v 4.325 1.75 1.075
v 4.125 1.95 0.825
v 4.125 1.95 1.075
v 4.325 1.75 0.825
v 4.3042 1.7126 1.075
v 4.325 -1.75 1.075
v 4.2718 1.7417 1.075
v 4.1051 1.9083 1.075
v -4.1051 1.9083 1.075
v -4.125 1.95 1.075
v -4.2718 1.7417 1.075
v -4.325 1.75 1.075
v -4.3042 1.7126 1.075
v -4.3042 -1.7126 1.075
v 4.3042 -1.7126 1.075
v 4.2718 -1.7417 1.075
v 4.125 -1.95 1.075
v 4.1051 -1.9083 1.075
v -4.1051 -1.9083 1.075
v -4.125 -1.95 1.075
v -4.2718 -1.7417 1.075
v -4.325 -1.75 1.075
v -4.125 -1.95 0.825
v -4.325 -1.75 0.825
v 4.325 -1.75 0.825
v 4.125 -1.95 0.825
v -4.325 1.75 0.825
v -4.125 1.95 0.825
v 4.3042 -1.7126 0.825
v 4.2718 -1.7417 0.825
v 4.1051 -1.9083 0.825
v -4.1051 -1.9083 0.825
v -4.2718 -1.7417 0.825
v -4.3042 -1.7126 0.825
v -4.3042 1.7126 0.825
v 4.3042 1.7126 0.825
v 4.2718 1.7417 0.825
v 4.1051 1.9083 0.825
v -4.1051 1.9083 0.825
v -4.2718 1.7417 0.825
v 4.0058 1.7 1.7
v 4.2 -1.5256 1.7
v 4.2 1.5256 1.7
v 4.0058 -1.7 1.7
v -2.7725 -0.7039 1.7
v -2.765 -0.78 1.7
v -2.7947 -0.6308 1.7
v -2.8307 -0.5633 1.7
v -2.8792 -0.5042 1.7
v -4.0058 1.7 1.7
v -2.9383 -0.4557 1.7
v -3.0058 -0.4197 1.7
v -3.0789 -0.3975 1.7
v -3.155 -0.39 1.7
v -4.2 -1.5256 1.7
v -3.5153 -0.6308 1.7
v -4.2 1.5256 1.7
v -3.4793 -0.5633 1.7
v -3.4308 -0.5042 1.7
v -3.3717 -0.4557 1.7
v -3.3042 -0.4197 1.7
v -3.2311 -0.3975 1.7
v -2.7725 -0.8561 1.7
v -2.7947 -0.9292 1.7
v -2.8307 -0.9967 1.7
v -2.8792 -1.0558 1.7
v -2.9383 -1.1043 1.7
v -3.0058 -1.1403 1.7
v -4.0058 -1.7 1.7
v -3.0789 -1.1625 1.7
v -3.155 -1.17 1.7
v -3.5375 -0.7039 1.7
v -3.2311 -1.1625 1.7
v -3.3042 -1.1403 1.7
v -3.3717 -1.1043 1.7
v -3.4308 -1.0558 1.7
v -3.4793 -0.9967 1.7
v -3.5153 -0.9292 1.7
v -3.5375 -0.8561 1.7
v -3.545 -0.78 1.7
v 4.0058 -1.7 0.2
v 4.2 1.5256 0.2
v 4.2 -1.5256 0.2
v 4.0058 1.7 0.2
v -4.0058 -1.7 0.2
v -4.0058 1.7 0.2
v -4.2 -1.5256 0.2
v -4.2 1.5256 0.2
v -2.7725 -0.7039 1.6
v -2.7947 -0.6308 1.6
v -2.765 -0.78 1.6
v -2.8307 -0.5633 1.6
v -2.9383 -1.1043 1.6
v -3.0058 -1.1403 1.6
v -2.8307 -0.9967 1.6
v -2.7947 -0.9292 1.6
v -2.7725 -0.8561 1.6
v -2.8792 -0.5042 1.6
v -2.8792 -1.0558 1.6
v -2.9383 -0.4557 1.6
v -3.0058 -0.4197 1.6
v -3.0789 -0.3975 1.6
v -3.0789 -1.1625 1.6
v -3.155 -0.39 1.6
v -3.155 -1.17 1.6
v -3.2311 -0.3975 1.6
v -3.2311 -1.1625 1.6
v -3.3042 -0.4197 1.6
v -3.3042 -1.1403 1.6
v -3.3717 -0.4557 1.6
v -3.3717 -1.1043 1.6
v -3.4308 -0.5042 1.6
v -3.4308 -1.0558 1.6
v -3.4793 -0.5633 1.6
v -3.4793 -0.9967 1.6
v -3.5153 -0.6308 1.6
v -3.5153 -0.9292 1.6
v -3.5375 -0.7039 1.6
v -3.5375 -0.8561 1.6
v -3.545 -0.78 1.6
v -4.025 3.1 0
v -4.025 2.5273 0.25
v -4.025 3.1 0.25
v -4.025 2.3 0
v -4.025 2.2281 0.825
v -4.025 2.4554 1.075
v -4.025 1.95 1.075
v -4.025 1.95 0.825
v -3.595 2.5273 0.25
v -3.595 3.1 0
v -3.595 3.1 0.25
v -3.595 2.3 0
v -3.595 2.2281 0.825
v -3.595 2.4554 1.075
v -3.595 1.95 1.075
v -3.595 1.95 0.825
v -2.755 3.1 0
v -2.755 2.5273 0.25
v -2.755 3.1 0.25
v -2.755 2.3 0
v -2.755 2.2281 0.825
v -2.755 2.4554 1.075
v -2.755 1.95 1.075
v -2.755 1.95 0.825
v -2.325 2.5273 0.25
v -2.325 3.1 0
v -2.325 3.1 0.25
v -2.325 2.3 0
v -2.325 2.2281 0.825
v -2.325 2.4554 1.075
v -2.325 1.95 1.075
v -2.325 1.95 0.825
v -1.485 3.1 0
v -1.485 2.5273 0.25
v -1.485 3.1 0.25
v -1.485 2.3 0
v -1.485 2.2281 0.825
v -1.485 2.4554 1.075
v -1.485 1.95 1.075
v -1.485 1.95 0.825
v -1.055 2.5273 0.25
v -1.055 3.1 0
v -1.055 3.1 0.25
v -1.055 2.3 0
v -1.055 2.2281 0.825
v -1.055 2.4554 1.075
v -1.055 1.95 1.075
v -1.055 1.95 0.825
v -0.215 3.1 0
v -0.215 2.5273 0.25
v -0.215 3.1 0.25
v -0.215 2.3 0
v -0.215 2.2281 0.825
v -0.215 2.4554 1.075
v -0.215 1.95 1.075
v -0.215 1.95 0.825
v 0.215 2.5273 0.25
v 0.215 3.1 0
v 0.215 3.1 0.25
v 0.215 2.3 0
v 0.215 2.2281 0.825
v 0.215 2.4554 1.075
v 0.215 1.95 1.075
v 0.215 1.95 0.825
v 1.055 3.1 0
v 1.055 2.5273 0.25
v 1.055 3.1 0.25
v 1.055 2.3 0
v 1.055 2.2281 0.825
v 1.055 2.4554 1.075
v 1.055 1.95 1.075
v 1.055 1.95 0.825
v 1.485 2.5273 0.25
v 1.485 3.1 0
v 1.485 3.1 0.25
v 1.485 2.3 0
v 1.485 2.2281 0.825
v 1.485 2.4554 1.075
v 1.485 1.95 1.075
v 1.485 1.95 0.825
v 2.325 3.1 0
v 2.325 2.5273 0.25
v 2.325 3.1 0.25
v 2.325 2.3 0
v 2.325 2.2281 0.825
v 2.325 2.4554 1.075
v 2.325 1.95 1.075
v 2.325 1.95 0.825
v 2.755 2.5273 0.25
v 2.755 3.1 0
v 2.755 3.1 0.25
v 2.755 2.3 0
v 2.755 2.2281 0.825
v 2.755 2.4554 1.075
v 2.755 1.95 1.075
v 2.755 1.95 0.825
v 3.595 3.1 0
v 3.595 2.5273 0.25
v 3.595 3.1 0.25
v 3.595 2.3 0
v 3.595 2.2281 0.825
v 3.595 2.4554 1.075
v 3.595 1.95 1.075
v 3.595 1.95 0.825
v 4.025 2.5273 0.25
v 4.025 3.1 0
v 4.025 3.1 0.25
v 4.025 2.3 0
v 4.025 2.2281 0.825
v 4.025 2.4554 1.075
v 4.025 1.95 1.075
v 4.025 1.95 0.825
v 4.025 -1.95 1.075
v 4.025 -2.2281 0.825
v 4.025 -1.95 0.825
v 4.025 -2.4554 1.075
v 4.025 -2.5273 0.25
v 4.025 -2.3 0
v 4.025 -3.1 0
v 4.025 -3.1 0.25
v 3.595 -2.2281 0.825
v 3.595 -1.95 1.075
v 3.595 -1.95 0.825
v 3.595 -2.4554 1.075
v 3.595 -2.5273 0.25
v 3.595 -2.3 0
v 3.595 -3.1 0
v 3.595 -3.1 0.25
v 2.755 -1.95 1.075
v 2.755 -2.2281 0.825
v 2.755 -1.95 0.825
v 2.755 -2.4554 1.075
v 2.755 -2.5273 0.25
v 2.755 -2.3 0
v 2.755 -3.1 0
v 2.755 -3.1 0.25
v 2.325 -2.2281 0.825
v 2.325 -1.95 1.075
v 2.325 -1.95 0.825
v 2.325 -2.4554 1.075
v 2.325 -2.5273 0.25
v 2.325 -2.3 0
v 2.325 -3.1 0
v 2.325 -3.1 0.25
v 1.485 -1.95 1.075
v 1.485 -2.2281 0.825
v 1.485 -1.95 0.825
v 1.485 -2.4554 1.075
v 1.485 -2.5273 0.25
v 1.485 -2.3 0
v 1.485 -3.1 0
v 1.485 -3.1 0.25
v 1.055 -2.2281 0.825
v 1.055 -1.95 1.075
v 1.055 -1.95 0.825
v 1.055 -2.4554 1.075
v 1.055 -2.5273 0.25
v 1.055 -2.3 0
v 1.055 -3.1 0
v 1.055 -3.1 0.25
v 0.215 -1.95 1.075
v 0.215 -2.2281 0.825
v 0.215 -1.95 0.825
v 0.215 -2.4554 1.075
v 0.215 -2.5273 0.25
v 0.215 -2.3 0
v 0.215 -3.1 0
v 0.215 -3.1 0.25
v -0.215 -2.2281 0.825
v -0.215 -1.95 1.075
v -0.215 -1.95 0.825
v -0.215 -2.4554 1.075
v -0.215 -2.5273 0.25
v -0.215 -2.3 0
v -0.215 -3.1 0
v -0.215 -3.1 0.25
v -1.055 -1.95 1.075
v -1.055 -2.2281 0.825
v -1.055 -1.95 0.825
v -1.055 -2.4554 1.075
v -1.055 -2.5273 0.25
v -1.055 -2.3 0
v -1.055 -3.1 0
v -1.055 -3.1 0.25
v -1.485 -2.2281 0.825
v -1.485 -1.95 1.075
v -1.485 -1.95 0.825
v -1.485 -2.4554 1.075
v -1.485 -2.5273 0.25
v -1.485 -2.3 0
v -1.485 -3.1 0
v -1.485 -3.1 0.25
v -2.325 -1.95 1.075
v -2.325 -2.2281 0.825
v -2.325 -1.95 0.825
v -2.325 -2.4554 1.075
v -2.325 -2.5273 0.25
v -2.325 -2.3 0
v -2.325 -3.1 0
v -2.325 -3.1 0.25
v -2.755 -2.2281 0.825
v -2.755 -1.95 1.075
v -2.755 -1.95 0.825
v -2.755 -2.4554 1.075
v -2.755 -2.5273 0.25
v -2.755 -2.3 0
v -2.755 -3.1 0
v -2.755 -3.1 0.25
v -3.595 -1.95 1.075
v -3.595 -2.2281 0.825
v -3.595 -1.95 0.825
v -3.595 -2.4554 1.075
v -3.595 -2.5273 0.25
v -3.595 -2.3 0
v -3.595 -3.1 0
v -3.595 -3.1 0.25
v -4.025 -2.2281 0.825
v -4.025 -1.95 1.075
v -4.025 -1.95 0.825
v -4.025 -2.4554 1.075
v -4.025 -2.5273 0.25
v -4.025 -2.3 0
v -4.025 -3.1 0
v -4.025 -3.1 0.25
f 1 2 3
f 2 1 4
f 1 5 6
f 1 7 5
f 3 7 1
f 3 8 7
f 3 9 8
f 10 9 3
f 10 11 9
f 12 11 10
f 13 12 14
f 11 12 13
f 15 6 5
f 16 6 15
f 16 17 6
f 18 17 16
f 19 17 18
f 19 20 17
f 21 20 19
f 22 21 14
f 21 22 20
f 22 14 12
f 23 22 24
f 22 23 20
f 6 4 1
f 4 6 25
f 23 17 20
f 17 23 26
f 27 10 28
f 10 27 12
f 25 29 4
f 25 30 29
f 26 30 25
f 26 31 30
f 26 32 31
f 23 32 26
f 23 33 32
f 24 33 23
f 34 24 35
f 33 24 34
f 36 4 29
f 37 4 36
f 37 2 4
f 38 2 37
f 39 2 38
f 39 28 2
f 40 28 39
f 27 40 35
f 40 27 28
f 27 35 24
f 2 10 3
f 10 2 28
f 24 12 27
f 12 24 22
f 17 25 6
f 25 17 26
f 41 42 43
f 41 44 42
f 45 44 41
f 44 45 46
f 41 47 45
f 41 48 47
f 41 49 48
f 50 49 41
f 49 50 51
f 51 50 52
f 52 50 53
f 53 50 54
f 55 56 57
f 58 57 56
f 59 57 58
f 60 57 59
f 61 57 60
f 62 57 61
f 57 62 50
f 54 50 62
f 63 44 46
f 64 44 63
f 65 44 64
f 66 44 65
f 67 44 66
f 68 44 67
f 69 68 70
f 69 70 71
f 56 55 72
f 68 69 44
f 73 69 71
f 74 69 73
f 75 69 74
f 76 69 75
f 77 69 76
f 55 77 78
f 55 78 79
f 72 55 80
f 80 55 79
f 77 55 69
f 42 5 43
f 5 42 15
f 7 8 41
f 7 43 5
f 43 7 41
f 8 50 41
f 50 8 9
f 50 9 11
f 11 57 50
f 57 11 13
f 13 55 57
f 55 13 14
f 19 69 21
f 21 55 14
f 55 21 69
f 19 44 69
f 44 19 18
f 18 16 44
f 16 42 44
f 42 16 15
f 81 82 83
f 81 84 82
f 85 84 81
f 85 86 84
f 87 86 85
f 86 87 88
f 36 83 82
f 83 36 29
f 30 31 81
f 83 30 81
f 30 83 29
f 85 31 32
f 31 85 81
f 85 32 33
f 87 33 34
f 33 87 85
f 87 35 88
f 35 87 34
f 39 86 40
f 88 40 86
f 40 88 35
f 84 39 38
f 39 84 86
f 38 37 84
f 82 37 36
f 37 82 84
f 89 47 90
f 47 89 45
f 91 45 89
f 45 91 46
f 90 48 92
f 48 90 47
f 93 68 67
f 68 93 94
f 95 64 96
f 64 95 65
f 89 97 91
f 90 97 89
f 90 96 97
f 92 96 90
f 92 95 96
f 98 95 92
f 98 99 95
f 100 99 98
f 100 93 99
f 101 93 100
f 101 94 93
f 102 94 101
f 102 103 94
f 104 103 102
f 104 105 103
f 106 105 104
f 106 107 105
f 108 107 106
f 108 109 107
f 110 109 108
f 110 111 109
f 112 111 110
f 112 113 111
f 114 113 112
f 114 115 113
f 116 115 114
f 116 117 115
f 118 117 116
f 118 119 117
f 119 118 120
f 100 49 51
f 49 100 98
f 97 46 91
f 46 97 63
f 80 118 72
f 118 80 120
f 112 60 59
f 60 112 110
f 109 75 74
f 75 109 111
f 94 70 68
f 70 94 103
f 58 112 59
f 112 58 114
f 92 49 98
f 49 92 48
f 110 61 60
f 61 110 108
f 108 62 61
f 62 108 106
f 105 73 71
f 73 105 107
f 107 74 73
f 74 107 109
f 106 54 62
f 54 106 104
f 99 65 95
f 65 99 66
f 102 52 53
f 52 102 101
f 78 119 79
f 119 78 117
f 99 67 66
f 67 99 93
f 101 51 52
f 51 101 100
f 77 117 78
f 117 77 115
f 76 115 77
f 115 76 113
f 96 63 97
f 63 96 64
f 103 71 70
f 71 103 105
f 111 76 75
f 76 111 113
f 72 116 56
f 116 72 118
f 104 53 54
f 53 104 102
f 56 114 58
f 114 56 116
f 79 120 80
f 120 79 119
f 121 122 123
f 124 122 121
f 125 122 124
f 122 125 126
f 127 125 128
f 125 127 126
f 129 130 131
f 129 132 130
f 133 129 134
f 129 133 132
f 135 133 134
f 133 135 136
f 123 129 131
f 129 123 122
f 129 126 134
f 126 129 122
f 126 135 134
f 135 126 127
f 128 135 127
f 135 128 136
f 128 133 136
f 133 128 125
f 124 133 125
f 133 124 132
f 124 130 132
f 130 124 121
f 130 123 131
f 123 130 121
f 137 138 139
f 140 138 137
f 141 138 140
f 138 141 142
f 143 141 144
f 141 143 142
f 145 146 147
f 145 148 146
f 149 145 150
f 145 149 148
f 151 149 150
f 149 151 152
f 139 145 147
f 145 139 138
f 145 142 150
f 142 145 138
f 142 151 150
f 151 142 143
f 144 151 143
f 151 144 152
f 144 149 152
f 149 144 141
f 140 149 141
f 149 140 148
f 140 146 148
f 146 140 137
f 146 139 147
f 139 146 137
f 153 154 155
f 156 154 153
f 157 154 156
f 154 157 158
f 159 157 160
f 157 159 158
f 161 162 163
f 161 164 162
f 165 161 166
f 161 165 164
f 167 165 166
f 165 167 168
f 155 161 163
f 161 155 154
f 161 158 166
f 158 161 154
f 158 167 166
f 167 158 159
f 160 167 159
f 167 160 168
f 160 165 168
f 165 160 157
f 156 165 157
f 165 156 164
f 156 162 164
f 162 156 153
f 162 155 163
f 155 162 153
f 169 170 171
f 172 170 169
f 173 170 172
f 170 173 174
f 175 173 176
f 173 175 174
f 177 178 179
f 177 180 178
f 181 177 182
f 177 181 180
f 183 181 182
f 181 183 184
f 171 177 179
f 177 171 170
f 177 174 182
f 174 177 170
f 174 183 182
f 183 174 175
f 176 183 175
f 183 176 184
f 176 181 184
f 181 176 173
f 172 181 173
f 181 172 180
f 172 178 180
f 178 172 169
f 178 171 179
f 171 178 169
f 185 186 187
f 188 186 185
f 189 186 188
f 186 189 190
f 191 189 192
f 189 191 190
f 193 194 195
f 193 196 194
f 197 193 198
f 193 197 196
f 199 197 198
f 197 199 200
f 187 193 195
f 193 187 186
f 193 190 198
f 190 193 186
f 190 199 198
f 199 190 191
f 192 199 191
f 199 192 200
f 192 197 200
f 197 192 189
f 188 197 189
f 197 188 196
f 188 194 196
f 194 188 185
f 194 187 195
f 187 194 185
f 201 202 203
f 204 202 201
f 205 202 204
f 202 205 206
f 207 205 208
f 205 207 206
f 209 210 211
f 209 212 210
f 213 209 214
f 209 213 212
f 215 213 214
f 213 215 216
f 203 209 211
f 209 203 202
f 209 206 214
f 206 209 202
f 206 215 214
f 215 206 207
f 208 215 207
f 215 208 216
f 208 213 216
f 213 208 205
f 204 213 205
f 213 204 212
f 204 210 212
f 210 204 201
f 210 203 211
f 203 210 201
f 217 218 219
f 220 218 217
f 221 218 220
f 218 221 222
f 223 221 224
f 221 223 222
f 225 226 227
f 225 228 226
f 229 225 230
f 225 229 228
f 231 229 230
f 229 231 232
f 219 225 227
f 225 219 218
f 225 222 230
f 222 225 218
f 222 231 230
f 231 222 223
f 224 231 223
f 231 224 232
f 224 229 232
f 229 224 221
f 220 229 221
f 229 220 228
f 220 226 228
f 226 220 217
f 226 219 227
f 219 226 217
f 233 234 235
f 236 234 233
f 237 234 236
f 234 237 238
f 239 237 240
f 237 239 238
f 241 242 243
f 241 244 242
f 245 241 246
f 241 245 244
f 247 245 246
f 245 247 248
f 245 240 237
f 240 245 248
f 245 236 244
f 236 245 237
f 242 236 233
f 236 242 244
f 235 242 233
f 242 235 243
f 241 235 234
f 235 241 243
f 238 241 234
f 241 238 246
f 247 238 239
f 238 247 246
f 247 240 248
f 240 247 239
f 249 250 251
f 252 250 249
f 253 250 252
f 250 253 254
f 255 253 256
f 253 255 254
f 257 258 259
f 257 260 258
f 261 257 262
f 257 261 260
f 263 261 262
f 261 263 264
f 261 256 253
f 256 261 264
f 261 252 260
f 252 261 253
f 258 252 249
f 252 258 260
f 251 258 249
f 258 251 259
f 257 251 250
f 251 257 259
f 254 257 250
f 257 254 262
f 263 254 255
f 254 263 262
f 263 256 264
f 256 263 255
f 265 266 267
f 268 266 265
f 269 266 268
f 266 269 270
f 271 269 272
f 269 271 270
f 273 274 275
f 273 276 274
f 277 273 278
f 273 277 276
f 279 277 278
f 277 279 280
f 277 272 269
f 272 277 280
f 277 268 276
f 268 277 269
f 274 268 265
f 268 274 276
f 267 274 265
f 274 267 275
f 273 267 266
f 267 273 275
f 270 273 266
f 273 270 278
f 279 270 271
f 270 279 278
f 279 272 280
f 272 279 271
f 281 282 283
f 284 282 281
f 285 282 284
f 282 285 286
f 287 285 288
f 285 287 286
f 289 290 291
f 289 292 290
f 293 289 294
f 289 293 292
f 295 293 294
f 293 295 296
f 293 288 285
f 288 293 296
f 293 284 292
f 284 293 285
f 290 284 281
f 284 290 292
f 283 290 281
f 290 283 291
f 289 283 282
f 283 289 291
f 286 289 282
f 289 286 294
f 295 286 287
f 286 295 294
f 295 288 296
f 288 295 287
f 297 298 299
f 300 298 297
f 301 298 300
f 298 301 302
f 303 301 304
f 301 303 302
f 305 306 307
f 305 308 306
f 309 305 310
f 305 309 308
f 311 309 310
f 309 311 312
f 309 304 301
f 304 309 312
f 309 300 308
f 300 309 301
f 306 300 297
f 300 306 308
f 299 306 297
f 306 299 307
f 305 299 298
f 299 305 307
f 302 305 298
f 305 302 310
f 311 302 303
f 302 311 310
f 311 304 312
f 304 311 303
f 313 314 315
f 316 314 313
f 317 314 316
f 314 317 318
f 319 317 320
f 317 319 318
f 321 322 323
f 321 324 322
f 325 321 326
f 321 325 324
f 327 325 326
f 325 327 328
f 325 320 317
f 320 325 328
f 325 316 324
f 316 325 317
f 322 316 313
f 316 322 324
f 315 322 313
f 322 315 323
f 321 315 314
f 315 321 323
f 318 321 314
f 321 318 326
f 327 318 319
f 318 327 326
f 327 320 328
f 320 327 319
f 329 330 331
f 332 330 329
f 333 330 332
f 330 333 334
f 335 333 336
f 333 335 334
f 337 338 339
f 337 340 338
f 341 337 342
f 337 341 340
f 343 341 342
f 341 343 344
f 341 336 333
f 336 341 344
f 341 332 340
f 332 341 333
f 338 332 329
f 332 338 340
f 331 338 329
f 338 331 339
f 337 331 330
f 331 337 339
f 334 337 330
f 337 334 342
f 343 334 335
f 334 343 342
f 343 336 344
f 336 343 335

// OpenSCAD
pins = 14;
pin_pitch = 1.27;
pin_width = 0.43;
pin_seating = 0.8;
pin_gull_angle = 5;
leadframe_thickness = 0.25;

overall_width = 6.2;
body_width = 3.9;
body_length = 8.65;
body_thickness = 1.5;

total_thickness = 1.7;

body_length_bevel = 0.25;
body_width_bevel = 0.5;
body_chamfer = 0.2;


leadframe_height = total_thickness - body_thickness/2;

index_mark_offset = min(min(body_width, body_length) * 0.3, 1.5);
index_mark_radius = min(index_mark_offset / 3, 0.5);


difference() {
    body();
    color("#ddd") translate([
        -body_length / 2 + index_mark_offset,
        -body_width / 2 + index_mark_offset,
        total_thickness - 0.1,
    ]) cylinder(h = 10, r = index_mark_radius, $fn=32);
}


translate([pin_pitch * ((pins / 2) - 1) / -2, overall_width / 2, 0]) for(n = [0 : pins / 2 - 1]) {
    translate([pin_pitch * n, 0, 0]) pin();
}
rotate([0, 0, 180]) translate([pin_pitch * ((pins / 2) - 1) / -2, overall_width / 2, 0]) for(n = [0 : pins / 2 - 1]) {
    translate([pin_pitch * n, 0, 0]) pin();
}


module pin() {
    color("#999") rotate([90, 0, 90]) linear_extrude(height = pin_width, center = true) {
        gull_offset = leadframe_height - leadframe_thickness / 2;
        pin_length = (overall_width - body_width) / 2;
        sine = sin(pin_gull_angle);
        cosine = cos(pin_gull_angle);
        polygon([
            [0, 0],
            [-pin_seating, 0],
            [-pin_seating - sine * gull_offset, gull_offset],
            [-pin_length, gull_offset],
            [-pin_length, gull_offset + leadframe_thickness],
            [-pin_seating - sine * (gull_offset + leadframe_thickness) + cosine * leadframe_thickness, gull_offset + leadframe_thickness],
            [-pin_seating - sine * leadframe_thickness + cosine * leadframe_thickness, leadframe_thickness],
            [0, leadframe_thickness],
        ]);
    }
}


module body() {
    color("#555") translate([0, 0, leadframe_height]) {
        linear_extrude(height = leadframe_thickness, center = true) body_outline();
        linear_extrude(
            height = body_thickness / 2,
            scale = [(body_length - body_length_bevel) / body_length, (body_width - body_width_bevel) / body_width]
        ) body_outline();
        
        rotate([180, 0, 0]) linear_extrude(
            height = body_thickness / 2,
            scale = [(body_length - body_length_bevel) / body_length, (body_width - body_width_bevel) / body_width]
        ) body_outline();
    }
}
module body_outline() {
    polygon([
        [ -body_length/2 + body_chamfer, -body_width/2 ],
        [ -body_length/2               , -body_width/2 + body_chamfer ],
        [ -body_length/2               , +body_width/2 - body_chamfer ],
        [ -body_length/2 + body_chamfer, +body_width/2 ],
        [ +body_length/2 - body_chamfer, +body_width/2 ],
        [ +body_length/2               , +body_width/2 - body_chamfer ],
        [ +body_length/2               , -body_width/2 + body_chamfer ],
        [ +body_length/2 - body_chamfer, -body_width/2 ],
    ]);
}
